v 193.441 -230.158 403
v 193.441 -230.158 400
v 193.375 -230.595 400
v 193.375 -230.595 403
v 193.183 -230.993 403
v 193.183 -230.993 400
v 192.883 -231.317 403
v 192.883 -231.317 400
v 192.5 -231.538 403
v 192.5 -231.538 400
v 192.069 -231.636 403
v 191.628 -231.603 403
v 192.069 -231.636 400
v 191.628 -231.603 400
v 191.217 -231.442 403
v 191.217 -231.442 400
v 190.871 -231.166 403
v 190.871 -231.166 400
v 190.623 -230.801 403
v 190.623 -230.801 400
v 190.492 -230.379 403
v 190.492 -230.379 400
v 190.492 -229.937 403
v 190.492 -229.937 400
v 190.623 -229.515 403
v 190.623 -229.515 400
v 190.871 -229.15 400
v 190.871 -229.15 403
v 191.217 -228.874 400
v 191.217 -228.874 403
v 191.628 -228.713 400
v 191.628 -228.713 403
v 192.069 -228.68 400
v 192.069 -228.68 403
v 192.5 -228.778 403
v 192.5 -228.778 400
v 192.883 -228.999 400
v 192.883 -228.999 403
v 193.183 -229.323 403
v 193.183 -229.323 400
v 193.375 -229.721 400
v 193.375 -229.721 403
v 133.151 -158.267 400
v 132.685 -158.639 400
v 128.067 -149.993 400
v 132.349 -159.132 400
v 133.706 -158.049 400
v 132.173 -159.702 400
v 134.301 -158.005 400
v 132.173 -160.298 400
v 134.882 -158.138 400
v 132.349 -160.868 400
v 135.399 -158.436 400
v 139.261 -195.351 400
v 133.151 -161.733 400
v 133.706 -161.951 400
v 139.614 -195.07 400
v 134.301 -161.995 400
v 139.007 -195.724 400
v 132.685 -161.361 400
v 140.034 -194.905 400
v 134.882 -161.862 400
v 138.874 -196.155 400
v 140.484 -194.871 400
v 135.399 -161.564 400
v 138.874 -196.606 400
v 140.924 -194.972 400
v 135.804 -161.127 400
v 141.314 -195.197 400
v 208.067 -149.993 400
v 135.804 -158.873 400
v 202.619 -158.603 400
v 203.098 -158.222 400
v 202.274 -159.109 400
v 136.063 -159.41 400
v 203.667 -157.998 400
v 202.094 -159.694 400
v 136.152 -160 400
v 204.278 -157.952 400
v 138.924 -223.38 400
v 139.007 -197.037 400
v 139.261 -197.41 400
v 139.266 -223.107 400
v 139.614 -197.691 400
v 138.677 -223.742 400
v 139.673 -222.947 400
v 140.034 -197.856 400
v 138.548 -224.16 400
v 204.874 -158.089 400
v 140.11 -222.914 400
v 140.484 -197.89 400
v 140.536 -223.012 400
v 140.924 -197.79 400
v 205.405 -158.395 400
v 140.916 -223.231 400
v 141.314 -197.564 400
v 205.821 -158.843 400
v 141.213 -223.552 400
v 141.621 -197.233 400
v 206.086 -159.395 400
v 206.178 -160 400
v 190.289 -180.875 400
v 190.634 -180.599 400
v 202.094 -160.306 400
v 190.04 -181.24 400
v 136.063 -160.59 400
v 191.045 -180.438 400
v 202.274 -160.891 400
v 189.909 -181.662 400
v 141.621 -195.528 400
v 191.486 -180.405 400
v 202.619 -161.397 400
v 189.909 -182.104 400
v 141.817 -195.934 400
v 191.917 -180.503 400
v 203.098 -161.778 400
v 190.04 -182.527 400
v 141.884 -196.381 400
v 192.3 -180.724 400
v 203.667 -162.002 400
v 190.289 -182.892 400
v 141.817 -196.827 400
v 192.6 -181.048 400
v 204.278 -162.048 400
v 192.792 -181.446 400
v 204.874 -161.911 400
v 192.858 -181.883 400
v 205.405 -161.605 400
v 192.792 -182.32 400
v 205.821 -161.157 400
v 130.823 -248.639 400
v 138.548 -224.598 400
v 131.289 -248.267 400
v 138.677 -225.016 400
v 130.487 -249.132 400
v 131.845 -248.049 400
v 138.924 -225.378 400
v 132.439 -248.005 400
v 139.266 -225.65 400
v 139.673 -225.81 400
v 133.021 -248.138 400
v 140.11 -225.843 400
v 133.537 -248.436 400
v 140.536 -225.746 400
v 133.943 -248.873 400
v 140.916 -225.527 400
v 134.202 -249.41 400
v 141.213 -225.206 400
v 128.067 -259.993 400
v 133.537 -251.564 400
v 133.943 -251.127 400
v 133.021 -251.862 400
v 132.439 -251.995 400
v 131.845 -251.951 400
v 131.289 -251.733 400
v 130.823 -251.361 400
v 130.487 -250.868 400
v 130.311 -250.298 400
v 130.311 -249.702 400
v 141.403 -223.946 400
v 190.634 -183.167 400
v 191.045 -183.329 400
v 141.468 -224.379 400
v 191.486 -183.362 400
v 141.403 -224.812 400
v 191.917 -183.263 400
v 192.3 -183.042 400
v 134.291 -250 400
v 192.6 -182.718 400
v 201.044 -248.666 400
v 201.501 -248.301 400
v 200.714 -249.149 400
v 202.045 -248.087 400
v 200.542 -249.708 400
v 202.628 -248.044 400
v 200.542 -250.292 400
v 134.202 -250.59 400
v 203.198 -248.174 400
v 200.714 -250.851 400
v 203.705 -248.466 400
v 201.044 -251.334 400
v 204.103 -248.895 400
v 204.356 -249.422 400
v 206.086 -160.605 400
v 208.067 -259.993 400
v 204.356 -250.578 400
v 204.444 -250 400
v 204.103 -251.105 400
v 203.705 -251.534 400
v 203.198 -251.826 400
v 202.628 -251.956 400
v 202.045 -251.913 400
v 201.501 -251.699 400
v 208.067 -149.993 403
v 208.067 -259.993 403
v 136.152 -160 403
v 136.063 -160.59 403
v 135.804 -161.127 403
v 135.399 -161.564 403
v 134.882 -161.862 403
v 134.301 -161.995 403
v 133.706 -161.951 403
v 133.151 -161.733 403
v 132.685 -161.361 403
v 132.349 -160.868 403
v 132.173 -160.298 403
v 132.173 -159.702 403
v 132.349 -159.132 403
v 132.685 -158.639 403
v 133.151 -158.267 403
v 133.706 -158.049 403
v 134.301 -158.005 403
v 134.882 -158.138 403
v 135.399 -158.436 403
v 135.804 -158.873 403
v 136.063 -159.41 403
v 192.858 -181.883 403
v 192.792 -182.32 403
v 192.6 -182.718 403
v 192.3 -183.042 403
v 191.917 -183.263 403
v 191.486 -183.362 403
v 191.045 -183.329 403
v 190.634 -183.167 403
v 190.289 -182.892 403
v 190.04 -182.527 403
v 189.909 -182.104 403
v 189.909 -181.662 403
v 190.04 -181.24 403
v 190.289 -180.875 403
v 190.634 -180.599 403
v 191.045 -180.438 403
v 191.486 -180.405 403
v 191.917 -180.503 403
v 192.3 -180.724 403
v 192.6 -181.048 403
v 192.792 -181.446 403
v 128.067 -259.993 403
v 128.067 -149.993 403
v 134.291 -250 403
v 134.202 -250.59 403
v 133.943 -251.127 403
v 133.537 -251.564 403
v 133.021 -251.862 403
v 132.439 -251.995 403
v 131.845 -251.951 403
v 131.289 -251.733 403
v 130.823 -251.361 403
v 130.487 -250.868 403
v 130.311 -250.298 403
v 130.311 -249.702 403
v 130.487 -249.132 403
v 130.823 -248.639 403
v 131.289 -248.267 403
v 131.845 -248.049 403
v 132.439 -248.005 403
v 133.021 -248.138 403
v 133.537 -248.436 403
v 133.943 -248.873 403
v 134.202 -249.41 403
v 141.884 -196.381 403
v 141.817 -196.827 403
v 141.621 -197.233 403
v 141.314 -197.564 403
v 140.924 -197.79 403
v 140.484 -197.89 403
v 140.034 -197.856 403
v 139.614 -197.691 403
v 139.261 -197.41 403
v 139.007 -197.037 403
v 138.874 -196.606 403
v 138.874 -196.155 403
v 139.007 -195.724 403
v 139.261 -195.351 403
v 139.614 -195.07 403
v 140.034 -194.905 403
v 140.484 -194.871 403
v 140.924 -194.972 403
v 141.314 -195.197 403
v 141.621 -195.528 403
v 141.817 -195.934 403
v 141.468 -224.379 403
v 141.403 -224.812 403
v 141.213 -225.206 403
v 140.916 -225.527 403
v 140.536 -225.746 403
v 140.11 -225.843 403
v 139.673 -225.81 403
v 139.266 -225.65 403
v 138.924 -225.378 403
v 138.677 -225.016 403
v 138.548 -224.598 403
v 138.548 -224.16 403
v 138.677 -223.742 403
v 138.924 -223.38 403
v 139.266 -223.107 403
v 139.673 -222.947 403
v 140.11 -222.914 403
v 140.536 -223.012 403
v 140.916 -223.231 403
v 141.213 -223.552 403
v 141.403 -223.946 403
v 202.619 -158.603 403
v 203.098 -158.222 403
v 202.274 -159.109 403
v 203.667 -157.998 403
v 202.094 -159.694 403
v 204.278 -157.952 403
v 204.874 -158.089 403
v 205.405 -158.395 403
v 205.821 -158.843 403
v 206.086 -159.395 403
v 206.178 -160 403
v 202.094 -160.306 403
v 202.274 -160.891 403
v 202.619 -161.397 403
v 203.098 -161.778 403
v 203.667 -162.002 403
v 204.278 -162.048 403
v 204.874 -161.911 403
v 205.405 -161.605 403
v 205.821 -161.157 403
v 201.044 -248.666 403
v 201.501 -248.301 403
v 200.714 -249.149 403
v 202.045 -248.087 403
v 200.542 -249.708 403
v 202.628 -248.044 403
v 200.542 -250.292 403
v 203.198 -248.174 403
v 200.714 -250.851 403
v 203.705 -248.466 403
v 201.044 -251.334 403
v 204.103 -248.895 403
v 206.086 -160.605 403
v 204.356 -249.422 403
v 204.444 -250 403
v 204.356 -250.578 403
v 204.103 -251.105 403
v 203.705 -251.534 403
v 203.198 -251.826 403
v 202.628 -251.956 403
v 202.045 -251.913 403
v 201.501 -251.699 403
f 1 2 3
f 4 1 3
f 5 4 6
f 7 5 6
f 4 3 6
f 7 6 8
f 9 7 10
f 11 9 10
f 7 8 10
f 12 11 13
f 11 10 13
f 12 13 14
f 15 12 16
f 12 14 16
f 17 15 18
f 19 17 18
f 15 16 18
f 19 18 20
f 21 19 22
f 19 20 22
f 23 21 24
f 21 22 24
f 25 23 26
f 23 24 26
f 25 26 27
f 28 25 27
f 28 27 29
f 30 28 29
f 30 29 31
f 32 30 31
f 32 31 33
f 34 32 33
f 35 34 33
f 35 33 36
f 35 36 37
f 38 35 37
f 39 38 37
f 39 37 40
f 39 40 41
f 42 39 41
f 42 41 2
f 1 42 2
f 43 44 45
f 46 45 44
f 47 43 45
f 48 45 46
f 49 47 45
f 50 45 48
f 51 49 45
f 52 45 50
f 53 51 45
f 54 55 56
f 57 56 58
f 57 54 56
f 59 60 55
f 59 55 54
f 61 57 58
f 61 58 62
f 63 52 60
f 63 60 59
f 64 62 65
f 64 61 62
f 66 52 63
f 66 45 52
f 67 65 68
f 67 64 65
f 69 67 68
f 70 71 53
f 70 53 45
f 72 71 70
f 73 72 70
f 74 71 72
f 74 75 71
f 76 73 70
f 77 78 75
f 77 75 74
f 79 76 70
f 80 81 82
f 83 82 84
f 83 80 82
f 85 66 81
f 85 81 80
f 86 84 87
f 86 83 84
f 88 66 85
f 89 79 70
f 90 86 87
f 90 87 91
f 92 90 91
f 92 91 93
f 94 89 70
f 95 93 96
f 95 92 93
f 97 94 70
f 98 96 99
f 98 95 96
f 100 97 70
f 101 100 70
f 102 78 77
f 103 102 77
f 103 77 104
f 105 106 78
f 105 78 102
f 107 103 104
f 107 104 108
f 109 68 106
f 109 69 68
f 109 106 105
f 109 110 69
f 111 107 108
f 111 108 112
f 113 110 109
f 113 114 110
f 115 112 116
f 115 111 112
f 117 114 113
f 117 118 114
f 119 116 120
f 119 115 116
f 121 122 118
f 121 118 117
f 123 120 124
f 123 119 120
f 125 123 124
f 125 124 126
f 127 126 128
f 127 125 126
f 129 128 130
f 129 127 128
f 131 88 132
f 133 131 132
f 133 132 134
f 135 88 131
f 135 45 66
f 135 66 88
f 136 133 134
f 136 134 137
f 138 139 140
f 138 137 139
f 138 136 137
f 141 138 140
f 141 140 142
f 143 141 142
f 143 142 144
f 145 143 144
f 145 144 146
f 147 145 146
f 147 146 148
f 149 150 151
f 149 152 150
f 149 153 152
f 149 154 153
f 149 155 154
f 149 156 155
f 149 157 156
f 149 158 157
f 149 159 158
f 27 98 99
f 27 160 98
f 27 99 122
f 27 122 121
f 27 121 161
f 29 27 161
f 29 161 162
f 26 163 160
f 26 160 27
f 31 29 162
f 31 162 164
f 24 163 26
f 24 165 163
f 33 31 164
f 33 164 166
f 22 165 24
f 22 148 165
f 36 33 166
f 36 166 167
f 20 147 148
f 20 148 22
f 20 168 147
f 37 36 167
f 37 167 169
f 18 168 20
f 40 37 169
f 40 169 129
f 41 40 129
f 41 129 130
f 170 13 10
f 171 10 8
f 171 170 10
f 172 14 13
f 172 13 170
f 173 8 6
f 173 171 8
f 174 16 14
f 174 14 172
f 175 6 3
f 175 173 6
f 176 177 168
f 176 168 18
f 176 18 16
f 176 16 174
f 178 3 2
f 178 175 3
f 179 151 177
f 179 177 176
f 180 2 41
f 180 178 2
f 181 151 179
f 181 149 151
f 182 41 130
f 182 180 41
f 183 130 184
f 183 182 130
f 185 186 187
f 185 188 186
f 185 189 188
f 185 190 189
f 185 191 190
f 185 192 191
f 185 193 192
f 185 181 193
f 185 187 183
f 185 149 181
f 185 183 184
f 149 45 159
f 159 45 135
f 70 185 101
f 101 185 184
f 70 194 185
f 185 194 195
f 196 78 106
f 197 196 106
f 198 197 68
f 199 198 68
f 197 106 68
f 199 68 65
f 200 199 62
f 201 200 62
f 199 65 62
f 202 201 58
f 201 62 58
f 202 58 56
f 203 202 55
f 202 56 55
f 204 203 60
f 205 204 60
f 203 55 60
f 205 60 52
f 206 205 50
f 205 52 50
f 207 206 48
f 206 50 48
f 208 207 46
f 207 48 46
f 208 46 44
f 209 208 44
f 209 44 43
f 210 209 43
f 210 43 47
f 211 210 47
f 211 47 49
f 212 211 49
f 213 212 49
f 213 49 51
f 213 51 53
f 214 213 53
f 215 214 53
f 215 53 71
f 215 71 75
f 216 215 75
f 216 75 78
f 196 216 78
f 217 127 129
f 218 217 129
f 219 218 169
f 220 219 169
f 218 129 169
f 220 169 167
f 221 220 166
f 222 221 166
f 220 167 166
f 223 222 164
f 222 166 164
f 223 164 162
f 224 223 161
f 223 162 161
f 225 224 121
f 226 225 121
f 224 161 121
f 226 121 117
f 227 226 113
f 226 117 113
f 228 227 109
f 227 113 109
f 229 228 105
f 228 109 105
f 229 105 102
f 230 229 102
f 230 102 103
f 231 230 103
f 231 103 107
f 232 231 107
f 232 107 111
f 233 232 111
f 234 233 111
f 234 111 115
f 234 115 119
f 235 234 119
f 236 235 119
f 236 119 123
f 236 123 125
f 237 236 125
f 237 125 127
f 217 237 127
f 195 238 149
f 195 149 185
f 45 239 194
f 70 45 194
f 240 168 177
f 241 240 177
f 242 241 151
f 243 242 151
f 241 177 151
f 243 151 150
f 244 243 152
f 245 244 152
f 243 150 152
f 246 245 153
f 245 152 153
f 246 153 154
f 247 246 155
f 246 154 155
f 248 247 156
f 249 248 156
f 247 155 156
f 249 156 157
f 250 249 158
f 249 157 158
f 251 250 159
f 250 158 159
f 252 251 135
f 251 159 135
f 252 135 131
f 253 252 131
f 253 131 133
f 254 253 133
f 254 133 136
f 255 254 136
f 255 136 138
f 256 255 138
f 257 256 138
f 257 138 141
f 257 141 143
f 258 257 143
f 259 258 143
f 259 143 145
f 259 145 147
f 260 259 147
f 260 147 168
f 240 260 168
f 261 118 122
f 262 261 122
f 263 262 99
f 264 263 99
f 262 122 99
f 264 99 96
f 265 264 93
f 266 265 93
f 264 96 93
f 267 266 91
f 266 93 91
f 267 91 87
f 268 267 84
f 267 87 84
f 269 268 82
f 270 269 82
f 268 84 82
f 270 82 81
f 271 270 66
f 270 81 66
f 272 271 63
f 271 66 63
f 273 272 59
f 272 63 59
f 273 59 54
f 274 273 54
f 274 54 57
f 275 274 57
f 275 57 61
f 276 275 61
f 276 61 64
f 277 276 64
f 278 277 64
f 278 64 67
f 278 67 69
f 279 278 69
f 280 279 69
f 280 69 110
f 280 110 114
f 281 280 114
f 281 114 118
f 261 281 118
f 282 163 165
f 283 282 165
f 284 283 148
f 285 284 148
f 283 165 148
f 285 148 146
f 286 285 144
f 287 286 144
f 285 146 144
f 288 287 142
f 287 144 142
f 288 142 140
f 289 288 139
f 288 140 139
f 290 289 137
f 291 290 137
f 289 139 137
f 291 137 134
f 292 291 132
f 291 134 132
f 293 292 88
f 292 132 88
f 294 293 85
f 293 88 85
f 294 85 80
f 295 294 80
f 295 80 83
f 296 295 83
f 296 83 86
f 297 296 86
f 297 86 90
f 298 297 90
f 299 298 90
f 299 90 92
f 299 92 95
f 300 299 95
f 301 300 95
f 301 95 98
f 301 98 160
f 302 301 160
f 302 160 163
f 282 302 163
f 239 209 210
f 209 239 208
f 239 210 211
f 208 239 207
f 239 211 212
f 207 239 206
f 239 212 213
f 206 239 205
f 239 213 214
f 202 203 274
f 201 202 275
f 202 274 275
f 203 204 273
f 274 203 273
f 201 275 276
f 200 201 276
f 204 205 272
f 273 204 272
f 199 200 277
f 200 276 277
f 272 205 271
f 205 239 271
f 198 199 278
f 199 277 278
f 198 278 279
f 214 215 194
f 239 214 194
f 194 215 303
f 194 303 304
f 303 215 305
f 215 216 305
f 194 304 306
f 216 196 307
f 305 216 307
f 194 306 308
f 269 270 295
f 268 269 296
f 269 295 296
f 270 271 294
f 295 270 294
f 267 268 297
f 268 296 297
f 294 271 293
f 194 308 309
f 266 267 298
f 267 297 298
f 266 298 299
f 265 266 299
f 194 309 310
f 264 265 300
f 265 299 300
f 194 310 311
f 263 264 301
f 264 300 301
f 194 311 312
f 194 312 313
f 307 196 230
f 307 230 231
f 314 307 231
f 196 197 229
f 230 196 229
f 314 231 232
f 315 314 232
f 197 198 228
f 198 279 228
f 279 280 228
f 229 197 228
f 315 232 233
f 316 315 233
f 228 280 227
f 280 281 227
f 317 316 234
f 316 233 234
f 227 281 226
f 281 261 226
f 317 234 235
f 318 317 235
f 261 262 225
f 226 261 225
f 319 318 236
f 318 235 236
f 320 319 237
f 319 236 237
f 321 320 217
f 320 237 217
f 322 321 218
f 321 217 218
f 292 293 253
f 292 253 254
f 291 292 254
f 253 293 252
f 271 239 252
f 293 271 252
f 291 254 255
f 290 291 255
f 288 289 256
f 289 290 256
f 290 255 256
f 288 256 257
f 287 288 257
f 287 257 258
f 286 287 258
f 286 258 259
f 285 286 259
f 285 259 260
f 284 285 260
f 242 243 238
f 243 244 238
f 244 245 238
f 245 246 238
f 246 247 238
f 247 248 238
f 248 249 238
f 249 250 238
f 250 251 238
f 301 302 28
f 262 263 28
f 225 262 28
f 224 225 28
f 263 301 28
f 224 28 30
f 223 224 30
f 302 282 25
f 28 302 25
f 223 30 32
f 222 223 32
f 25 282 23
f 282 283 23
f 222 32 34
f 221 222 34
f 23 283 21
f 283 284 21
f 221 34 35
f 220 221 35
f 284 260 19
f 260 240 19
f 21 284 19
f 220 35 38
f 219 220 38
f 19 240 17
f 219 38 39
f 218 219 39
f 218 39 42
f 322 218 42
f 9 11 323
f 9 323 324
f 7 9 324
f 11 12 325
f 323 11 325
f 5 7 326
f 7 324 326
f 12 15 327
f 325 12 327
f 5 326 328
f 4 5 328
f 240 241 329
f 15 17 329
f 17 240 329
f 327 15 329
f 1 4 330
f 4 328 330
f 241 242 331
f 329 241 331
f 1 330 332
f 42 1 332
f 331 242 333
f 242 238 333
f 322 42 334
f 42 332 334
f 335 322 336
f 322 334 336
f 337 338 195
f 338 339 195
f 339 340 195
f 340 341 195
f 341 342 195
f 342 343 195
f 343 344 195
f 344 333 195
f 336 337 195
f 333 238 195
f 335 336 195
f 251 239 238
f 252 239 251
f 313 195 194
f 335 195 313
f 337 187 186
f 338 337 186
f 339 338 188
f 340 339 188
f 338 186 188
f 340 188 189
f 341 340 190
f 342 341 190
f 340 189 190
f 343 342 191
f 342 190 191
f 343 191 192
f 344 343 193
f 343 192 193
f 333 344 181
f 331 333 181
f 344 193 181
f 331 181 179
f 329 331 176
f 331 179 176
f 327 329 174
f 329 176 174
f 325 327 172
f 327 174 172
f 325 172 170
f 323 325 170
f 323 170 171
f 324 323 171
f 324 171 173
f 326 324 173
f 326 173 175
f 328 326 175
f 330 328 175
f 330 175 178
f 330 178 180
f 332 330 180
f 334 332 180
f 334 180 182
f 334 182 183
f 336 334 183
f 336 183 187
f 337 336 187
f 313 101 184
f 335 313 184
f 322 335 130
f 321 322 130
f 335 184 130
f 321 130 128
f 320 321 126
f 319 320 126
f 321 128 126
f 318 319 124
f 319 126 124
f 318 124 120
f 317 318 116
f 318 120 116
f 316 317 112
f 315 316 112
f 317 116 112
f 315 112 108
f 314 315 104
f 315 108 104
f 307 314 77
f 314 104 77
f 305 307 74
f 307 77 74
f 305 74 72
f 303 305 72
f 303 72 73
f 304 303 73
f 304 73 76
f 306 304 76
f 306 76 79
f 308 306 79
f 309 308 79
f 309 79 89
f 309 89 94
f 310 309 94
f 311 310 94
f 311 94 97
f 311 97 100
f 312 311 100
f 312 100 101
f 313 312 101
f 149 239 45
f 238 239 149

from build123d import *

# Parameters (mm, degrees)
SKETCH010_W     = 80
SKETCH010_H     = 110
PAD010_DEPTH    = 3
SKETCH034_R     = 2.000703
SKETCH034_R_2   = 1.961844
SKETCH034_R_3   = 2.000693
SKETCH034_R_4   = 2.053285
POCKET013_DEPTH = 5
SKETCH009_R     = 1.482535
SKETCH009_R_2   = 1.48253
SKETCH009_R_3   = 1.51367
SKETCH009_R_4   = 1.468475
POCKET014_DEPTH = 5


with BuildPart() as part:
    # Sketch010 → Pad010 (new body)
    with BuildSketch(Plane(origin=(100, 0, 403), x_dir=(1, 0, 0), z_dir=(0, 0, -1))):
        with Locations((68.06718, 204.993062)):
            Rectangle(SKETCH010_W, SKETCH010_H)
    extrude(amount=PAD010_DEPTH)

    # Sketch034 → Pocket013 (cut)
    with BuildSketch(Plane(origin=(100, 0, 400), x_dir=(1, 0, 0), z_dir=(0, 0, -1))):
        with Locations((32.289825, 250)):
            Circle(SKETCH034_R)
        with Locations((102.48175, 250)):
            Circle(SKETCH034_R_2)
        with Locations((34.151398, 160)):
            Circle(SKETCH034_R_3)
        with Locations((104.124298, 160)):
            Circle(SKETCH034_R_4)
    extrude(amount=-POCKET013_DEPTH, mode=Mode.SUBTRACT)

    # Sketch009 → Pocket014 (cut)
    with BuildSketch(Plane(origin=(100, 0, 400), x_dir=(1, 0, 0), z_dir=(0, 0, -1))):
        with Locations((91.958268, 230.158066)):
            Circle(SKETCH009_R)
        with Locations((91.375338, 181.883286)):
            Circle(SKETCH009_R_2)
        with Locations((40.37064, 196.380576)):
            Circle(SKETCH009_R_3)
        with Locations((40, 224.378723)):
            Circle(SKETCH009_R_4)
    extrude(amount=-POCKET014_DEPTH, mode=Mode.SUBTRACT)


solid = part.part
